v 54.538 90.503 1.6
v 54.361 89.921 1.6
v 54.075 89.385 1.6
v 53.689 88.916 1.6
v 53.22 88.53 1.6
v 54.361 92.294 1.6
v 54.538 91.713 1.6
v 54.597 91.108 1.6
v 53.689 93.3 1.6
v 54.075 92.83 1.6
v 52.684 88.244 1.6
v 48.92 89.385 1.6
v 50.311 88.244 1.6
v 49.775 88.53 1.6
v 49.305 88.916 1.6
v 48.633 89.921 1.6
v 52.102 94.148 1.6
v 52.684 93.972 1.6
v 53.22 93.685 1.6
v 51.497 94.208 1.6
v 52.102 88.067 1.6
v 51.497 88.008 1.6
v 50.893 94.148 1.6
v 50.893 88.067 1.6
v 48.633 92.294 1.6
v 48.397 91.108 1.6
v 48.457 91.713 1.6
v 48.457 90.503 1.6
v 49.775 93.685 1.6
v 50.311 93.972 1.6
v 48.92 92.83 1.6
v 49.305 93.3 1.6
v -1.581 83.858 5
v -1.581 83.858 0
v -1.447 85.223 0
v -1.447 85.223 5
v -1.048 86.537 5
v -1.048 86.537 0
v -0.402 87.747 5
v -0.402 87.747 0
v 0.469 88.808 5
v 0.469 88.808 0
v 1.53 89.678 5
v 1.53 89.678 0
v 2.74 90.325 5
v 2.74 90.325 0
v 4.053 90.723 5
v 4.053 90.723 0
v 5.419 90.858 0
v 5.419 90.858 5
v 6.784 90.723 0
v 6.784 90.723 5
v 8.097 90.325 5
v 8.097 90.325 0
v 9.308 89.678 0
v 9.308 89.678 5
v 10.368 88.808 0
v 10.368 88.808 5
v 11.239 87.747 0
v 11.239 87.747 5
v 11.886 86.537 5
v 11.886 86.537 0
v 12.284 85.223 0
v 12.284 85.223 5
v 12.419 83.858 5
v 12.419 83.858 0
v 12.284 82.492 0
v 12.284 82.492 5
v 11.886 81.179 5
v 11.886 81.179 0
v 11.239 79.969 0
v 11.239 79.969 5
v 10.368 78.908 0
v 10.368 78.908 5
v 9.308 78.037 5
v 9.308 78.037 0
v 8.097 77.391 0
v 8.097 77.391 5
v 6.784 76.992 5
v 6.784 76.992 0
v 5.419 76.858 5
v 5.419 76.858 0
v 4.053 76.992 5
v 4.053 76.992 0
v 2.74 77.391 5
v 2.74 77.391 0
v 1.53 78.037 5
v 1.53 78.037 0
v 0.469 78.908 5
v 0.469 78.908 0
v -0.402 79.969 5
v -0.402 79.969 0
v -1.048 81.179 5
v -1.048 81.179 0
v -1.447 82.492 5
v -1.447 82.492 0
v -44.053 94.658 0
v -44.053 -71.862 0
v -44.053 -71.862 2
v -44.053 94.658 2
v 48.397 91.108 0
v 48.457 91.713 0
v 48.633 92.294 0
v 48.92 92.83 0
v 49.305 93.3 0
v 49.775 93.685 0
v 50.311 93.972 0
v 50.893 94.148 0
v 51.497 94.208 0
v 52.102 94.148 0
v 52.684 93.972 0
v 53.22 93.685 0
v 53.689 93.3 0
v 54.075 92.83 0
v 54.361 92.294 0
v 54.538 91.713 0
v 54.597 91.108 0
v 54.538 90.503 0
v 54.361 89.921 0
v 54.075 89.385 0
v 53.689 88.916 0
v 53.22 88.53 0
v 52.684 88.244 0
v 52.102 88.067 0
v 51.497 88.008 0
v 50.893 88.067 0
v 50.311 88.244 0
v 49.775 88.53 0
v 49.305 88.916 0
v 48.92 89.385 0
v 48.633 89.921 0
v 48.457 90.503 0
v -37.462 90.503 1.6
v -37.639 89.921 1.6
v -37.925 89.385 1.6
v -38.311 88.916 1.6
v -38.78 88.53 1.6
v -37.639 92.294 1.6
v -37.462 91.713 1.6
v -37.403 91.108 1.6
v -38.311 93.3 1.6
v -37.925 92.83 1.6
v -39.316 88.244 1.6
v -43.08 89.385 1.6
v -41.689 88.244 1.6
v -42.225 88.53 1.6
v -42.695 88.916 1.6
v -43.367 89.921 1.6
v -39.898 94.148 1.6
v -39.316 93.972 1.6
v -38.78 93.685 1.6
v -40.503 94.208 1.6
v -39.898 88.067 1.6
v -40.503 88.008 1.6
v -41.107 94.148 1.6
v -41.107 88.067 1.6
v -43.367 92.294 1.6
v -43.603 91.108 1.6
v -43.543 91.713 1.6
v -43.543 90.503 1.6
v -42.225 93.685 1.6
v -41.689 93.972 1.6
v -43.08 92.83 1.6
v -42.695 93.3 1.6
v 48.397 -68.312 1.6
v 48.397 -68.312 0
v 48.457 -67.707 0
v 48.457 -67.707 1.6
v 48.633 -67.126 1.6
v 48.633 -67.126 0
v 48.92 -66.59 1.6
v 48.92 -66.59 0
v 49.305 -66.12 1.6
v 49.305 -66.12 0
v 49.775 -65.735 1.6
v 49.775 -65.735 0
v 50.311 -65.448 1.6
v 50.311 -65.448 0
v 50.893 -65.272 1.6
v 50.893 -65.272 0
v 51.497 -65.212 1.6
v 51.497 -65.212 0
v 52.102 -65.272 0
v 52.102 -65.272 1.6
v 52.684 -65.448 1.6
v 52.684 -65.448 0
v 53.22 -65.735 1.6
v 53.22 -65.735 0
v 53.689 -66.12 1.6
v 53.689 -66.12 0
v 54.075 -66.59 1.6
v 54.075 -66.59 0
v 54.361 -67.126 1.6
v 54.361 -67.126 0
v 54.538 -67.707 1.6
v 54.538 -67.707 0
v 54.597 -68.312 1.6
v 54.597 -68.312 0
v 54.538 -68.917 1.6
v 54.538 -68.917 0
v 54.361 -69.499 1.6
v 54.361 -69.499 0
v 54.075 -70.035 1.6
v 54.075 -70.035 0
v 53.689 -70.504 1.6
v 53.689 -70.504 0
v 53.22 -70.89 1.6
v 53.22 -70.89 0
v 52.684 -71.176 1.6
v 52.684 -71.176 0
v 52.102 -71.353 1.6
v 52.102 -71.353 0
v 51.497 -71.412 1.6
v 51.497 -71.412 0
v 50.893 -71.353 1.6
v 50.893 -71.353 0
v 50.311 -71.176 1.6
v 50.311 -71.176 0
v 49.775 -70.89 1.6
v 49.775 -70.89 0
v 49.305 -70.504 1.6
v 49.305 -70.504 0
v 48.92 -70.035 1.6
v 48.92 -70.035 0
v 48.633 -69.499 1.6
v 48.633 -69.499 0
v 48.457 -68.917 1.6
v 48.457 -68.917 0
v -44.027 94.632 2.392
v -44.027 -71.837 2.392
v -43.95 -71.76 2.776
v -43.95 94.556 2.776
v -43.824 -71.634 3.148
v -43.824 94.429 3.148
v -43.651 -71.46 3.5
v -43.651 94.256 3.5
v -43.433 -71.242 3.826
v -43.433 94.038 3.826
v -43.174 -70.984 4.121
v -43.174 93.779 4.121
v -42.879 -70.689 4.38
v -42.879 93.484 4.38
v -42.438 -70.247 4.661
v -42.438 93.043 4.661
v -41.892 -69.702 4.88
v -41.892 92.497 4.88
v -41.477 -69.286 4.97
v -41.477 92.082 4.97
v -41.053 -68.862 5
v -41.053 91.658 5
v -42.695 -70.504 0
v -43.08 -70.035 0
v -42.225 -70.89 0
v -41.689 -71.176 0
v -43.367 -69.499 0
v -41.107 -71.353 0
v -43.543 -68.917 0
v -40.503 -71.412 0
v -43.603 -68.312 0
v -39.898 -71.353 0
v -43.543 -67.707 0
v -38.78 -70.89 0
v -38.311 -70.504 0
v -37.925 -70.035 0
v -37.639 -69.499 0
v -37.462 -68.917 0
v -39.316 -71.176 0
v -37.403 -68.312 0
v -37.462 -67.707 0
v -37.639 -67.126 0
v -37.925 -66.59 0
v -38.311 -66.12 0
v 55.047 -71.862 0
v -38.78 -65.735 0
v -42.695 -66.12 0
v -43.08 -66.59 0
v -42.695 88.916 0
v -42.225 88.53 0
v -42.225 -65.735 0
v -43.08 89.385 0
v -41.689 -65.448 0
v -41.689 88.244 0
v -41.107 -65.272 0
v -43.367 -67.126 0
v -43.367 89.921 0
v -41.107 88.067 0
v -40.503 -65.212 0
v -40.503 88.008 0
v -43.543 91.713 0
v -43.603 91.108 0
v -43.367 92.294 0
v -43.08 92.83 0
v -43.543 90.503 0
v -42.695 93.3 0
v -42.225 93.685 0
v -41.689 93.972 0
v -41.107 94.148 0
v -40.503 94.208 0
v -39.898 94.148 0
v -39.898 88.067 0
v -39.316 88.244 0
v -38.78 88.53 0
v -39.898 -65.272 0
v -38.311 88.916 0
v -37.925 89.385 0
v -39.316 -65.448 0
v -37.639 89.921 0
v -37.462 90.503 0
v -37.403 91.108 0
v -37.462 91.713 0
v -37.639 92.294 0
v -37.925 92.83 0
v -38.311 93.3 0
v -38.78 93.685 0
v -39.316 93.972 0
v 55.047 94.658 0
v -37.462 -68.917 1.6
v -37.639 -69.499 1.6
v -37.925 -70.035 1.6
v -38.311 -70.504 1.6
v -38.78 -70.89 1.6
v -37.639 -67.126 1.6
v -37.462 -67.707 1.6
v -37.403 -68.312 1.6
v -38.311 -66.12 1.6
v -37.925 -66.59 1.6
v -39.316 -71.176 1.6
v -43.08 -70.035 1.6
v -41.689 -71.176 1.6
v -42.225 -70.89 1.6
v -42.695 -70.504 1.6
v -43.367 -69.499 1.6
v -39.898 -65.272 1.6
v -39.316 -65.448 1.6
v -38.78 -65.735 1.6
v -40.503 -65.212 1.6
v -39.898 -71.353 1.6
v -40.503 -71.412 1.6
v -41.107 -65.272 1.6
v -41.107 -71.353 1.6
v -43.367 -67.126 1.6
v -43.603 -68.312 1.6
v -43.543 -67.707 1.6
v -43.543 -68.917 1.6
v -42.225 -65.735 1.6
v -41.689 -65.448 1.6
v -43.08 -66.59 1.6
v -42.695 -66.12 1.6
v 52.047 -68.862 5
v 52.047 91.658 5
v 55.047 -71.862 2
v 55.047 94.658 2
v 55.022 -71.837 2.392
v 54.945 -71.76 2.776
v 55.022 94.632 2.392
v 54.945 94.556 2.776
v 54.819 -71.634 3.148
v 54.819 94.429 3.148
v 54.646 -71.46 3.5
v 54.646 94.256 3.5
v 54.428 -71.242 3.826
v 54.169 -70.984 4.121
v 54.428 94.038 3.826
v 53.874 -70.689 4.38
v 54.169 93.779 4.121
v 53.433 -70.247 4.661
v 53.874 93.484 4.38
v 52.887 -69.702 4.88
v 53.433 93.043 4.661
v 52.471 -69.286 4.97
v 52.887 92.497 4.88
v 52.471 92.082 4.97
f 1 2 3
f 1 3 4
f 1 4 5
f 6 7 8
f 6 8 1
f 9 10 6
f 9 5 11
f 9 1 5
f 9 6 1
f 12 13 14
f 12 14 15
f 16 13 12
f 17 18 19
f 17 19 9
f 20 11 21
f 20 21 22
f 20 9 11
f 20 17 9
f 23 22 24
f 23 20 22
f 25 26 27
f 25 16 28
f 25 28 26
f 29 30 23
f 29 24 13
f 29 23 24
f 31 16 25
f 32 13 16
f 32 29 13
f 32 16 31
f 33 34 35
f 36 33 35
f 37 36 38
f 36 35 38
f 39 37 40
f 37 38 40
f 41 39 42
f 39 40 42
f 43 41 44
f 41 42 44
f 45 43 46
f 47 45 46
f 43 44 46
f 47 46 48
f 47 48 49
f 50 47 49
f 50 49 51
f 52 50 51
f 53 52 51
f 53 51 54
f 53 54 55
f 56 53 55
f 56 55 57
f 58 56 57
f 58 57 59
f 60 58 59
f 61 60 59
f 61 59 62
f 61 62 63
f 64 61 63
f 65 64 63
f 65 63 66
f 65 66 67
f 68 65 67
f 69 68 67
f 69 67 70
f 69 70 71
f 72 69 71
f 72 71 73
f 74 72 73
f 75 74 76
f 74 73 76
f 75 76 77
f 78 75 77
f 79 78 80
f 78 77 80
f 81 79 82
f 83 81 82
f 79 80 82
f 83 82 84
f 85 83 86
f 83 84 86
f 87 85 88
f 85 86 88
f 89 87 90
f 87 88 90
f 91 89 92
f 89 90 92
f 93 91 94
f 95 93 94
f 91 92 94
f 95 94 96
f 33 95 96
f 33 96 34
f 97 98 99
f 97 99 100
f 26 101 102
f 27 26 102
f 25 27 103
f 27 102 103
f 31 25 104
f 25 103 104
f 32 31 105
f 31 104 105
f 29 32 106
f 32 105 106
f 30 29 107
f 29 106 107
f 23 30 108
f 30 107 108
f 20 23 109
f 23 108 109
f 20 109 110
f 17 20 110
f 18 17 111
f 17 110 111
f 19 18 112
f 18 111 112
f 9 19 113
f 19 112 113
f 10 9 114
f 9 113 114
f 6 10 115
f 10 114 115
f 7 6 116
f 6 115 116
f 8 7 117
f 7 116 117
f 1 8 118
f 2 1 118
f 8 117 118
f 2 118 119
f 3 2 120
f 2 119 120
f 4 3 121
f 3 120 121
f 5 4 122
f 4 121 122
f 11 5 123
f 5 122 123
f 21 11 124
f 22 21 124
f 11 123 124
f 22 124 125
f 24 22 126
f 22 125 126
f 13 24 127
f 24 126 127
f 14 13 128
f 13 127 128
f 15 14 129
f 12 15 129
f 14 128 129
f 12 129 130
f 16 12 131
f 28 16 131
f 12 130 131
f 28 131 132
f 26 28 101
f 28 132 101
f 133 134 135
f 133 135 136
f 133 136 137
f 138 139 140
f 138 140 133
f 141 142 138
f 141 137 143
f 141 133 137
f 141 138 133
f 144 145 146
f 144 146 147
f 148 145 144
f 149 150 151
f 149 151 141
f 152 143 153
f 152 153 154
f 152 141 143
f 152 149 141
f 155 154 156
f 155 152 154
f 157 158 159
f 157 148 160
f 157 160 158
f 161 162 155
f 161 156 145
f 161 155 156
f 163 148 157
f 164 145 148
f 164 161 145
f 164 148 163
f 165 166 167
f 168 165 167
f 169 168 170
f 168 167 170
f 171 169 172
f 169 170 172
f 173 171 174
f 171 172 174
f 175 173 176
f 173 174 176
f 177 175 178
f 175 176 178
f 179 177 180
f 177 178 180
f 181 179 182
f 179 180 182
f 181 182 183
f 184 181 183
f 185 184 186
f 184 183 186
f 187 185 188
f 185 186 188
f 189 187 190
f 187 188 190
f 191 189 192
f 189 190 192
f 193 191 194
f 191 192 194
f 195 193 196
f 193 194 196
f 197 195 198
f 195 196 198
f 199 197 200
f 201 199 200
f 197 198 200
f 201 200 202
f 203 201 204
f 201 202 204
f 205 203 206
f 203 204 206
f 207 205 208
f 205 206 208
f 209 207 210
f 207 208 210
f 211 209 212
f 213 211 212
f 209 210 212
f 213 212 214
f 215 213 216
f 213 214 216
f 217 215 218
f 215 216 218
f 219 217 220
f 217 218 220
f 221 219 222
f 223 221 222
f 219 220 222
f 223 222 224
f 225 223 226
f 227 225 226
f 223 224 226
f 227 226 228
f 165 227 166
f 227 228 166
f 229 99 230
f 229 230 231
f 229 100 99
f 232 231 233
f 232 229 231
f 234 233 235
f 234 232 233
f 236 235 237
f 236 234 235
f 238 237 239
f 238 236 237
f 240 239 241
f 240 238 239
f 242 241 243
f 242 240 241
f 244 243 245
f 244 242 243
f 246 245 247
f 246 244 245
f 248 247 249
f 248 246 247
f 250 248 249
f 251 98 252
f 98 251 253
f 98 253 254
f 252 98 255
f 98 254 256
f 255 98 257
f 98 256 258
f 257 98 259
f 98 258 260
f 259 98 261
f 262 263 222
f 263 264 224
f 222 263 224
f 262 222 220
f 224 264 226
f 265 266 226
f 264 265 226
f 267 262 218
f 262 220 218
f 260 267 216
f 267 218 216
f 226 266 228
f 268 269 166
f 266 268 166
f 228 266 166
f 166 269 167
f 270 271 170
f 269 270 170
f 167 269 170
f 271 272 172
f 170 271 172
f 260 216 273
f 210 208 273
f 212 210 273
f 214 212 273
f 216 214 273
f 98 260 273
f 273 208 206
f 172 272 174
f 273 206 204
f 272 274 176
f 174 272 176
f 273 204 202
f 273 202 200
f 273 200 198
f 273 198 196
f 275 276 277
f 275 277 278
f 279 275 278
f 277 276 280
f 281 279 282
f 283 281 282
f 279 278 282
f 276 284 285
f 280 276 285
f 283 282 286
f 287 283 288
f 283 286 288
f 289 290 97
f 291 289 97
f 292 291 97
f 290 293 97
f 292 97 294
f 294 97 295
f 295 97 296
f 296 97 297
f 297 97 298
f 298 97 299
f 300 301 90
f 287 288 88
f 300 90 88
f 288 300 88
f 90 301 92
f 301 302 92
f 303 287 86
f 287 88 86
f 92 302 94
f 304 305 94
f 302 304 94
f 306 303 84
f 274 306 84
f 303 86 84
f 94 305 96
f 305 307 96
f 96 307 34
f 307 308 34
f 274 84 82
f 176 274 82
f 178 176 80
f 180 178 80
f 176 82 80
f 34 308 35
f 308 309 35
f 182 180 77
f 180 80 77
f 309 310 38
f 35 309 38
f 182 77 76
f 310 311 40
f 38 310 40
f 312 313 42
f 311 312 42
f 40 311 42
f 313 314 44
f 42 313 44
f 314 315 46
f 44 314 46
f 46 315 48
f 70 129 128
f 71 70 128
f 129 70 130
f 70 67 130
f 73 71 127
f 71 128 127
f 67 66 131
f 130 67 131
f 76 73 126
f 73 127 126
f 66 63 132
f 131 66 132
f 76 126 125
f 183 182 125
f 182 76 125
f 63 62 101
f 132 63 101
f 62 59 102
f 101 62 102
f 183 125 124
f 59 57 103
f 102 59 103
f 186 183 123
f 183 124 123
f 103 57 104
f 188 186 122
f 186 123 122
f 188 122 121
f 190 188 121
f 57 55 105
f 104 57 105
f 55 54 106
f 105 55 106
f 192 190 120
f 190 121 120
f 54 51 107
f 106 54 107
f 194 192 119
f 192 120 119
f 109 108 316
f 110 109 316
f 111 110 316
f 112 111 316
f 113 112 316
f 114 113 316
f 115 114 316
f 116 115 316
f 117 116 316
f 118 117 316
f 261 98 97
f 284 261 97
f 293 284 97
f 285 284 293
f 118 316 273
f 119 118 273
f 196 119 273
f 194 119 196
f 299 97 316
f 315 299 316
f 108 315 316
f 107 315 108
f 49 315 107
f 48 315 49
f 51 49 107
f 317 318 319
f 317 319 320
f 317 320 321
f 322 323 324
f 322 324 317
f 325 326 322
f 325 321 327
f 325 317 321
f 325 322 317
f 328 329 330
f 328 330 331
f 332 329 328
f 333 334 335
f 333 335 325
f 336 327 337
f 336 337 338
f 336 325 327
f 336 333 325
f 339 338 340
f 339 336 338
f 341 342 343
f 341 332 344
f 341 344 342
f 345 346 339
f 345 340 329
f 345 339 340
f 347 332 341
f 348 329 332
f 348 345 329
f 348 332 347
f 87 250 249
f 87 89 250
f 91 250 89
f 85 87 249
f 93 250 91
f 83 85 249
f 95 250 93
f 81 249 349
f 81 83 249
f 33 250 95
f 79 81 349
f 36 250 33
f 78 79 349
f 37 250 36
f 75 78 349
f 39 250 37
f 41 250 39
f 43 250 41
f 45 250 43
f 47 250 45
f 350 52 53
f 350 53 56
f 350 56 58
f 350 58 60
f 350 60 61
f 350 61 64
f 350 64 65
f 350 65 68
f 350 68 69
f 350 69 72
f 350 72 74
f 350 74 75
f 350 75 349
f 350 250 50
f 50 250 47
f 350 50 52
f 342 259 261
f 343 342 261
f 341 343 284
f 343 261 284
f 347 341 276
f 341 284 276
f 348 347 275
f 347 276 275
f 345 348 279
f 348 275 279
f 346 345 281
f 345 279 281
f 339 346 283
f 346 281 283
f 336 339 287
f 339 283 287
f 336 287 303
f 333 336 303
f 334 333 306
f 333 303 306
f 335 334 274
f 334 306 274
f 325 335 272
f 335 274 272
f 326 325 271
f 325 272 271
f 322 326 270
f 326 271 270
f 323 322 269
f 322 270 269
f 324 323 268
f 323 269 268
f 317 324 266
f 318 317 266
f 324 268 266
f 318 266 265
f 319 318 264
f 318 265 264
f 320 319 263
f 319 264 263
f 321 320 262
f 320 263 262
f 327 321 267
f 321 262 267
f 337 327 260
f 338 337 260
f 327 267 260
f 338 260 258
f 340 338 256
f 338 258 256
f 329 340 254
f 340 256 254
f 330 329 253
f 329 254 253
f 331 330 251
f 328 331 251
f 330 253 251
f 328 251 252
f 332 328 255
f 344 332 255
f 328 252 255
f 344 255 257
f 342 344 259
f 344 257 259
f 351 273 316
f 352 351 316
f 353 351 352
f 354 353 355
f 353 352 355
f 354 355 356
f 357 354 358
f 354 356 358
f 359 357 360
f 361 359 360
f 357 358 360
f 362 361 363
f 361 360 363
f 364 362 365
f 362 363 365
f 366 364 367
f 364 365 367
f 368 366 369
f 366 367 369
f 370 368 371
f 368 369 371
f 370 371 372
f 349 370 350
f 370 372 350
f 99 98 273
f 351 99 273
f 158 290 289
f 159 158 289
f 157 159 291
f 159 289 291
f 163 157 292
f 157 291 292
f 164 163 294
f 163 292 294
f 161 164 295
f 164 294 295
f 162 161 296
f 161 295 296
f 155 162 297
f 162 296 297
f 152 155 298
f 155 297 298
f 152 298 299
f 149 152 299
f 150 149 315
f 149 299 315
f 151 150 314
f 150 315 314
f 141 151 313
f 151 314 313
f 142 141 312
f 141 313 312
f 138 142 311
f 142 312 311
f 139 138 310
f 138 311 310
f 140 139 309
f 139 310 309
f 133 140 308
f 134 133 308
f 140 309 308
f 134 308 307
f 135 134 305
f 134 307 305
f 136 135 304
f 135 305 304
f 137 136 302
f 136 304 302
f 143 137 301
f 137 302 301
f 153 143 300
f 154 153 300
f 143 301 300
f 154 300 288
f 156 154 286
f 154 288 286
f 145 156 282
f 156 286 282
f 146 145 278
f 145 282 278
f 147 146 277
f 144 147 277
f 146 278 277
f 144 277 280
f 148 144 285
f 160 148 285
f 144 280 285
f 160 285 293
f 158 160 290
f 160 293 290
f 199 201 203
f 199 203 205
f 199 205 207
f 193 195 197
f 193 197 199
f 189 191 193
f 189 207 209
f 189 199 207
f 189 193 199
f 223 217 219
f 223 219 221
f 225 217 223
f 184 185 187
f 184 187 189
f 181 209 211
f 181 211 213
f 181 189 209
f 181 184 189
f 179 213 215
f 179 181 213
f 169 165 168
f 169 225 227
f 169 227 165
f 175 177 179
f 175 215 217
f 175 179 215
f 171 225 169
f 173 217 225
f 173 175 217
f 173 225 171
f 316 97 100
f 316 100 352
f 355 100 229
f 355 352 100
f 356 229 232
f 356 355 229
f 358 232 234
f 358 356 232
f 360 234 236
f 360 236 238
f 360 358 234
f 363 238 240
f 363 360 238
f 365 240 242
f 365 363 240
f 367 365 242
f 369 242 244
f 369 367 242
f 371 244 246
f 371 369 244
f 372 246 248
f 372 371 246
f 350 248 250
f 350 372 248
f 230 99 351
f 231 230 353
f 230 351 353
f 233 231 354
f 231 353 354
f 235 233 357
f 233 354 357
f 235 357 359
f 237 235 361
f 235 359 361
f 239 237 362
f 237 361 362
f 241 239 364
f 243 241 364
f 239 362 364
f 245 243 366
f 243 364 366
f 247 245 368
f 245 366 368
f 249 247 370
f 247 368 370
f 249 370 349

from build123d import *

# Parameters (mm, degrees)
ESBO_O1_W                = 99.1
ESBO_O1_H                = 166.52
RESSALTO_EXTRUS_O1_DEPTH = 5
FILETE1_R                = 3
ESBO_O2_R                = 3.1
CORTE_EXTRUS_O1_DEPTH    = 1.6
ESBO_O3_R                = 3.1
CORTE_EXTRUS_O2_DEPTH    = 1.6
ESBO_O4_R                = 3.1
CORTE_EXTRUS_O3_DEPTH    = 1.6
ESBO_O5_R                = 3.1
CORTE_EXTRUS_O4_DEPTH    = 1.6
ESBO_O6_R                = 7
CORTE_EXTRUS_O5_DEPTH    = 10


with BuildPart() as part:
    # Esboço1 → Ressalto-extrusão1 (new body)
    with BuildSketch(Plane.XY):
        with Locations((5.497464185, 11.397762804)):
            Rectangle(ESBO_O1_W, ESBO_O1_H)
    extrude(amount=RESSALTO_EXTRUS_O1_DEPTH)

    # Filete1
    filete1_edges = [part.edges().sort_by_distance(p)[0] for p in [
        (55.047464185, 11.397762804, 5),
        (5.497464185, 94.657762804, 5),
        (-44.052535815, 11.397762804, 5),
        (5.497464185, -71.862237196, 5),
    ]]
    fillet(filete1_edges, radius=FILETE1_R)

    # Esboço2 → Corte-extrusão1 (cut)
    with BuildSketch(Plane(origin=(0, 0, 0), x_dir=(-1, 0, 0), z_dir=(0, 0, -1))):
        with Locations((-51.497464185, 91.107762804)):
            Circle(ESBO_O2_R)
    extrude(amount=-CORTE_EXTRUS_O1_DEPTH, mode=Mode.SUBTRACT)

    # Esboço3 → Corte-extrusão2 (cut)
    with BuildSketch(Plane(origin=(0, 0, 0), x_dir=(-1, 0, 0), z_dir=(0, 0, -1))):
        with Locations((40.502535815, 91.107762804)):
            Circle(ESBO_O3_R)
    extrude(amount=-CORTE_EXTRUS_O2_DEPTH, mode=Mode.SUBTRACT)

    # Esboço4 → Corte-extrusão3 (cut)
    with BuildSketch(Plane(origin=(0, 0, 0), x_dir=(-1, 0, 0), z_dir=(0, 0, -1))):
        with Locations((-51.497464185, -68.312237196)):
            Circle(ESBO_O4_R)
    extrude(amount=-CORTE_EXTRUS_O3_DEPTH, mode=Mode.SUBTRACT)

    # Esboço5 → Corte-extrusão4 (cut)
    with BuildSketch(Plane(origin=(0, 0, 0), x_dir=(-1, 0, 0), z_dir=(0, 0, -1))):
        with Locations((40.502535815, -68.312237196)):
            Circle(ESBO_O5_R)
    extrude(amount=-CORTE_EXTRUS_O4_DEPTH, mode=Mode.SUBTRACT)

    # Esboço6 → Corte-extrusão5 (cut)
    with BuildSketch(Plane(origin=(0, 0, 0), x_dir=(-1, 0, 0), z_dir=(0, 0, -1))):
        with Locations((-5.41867497, 83.857762804)):
            Circle(ESBO_O6_R)
    extrude(amount=-CORTE_EXTRUS_O5_DEPTH, mode=Mode.SUBTRACT)


solid = part.part
